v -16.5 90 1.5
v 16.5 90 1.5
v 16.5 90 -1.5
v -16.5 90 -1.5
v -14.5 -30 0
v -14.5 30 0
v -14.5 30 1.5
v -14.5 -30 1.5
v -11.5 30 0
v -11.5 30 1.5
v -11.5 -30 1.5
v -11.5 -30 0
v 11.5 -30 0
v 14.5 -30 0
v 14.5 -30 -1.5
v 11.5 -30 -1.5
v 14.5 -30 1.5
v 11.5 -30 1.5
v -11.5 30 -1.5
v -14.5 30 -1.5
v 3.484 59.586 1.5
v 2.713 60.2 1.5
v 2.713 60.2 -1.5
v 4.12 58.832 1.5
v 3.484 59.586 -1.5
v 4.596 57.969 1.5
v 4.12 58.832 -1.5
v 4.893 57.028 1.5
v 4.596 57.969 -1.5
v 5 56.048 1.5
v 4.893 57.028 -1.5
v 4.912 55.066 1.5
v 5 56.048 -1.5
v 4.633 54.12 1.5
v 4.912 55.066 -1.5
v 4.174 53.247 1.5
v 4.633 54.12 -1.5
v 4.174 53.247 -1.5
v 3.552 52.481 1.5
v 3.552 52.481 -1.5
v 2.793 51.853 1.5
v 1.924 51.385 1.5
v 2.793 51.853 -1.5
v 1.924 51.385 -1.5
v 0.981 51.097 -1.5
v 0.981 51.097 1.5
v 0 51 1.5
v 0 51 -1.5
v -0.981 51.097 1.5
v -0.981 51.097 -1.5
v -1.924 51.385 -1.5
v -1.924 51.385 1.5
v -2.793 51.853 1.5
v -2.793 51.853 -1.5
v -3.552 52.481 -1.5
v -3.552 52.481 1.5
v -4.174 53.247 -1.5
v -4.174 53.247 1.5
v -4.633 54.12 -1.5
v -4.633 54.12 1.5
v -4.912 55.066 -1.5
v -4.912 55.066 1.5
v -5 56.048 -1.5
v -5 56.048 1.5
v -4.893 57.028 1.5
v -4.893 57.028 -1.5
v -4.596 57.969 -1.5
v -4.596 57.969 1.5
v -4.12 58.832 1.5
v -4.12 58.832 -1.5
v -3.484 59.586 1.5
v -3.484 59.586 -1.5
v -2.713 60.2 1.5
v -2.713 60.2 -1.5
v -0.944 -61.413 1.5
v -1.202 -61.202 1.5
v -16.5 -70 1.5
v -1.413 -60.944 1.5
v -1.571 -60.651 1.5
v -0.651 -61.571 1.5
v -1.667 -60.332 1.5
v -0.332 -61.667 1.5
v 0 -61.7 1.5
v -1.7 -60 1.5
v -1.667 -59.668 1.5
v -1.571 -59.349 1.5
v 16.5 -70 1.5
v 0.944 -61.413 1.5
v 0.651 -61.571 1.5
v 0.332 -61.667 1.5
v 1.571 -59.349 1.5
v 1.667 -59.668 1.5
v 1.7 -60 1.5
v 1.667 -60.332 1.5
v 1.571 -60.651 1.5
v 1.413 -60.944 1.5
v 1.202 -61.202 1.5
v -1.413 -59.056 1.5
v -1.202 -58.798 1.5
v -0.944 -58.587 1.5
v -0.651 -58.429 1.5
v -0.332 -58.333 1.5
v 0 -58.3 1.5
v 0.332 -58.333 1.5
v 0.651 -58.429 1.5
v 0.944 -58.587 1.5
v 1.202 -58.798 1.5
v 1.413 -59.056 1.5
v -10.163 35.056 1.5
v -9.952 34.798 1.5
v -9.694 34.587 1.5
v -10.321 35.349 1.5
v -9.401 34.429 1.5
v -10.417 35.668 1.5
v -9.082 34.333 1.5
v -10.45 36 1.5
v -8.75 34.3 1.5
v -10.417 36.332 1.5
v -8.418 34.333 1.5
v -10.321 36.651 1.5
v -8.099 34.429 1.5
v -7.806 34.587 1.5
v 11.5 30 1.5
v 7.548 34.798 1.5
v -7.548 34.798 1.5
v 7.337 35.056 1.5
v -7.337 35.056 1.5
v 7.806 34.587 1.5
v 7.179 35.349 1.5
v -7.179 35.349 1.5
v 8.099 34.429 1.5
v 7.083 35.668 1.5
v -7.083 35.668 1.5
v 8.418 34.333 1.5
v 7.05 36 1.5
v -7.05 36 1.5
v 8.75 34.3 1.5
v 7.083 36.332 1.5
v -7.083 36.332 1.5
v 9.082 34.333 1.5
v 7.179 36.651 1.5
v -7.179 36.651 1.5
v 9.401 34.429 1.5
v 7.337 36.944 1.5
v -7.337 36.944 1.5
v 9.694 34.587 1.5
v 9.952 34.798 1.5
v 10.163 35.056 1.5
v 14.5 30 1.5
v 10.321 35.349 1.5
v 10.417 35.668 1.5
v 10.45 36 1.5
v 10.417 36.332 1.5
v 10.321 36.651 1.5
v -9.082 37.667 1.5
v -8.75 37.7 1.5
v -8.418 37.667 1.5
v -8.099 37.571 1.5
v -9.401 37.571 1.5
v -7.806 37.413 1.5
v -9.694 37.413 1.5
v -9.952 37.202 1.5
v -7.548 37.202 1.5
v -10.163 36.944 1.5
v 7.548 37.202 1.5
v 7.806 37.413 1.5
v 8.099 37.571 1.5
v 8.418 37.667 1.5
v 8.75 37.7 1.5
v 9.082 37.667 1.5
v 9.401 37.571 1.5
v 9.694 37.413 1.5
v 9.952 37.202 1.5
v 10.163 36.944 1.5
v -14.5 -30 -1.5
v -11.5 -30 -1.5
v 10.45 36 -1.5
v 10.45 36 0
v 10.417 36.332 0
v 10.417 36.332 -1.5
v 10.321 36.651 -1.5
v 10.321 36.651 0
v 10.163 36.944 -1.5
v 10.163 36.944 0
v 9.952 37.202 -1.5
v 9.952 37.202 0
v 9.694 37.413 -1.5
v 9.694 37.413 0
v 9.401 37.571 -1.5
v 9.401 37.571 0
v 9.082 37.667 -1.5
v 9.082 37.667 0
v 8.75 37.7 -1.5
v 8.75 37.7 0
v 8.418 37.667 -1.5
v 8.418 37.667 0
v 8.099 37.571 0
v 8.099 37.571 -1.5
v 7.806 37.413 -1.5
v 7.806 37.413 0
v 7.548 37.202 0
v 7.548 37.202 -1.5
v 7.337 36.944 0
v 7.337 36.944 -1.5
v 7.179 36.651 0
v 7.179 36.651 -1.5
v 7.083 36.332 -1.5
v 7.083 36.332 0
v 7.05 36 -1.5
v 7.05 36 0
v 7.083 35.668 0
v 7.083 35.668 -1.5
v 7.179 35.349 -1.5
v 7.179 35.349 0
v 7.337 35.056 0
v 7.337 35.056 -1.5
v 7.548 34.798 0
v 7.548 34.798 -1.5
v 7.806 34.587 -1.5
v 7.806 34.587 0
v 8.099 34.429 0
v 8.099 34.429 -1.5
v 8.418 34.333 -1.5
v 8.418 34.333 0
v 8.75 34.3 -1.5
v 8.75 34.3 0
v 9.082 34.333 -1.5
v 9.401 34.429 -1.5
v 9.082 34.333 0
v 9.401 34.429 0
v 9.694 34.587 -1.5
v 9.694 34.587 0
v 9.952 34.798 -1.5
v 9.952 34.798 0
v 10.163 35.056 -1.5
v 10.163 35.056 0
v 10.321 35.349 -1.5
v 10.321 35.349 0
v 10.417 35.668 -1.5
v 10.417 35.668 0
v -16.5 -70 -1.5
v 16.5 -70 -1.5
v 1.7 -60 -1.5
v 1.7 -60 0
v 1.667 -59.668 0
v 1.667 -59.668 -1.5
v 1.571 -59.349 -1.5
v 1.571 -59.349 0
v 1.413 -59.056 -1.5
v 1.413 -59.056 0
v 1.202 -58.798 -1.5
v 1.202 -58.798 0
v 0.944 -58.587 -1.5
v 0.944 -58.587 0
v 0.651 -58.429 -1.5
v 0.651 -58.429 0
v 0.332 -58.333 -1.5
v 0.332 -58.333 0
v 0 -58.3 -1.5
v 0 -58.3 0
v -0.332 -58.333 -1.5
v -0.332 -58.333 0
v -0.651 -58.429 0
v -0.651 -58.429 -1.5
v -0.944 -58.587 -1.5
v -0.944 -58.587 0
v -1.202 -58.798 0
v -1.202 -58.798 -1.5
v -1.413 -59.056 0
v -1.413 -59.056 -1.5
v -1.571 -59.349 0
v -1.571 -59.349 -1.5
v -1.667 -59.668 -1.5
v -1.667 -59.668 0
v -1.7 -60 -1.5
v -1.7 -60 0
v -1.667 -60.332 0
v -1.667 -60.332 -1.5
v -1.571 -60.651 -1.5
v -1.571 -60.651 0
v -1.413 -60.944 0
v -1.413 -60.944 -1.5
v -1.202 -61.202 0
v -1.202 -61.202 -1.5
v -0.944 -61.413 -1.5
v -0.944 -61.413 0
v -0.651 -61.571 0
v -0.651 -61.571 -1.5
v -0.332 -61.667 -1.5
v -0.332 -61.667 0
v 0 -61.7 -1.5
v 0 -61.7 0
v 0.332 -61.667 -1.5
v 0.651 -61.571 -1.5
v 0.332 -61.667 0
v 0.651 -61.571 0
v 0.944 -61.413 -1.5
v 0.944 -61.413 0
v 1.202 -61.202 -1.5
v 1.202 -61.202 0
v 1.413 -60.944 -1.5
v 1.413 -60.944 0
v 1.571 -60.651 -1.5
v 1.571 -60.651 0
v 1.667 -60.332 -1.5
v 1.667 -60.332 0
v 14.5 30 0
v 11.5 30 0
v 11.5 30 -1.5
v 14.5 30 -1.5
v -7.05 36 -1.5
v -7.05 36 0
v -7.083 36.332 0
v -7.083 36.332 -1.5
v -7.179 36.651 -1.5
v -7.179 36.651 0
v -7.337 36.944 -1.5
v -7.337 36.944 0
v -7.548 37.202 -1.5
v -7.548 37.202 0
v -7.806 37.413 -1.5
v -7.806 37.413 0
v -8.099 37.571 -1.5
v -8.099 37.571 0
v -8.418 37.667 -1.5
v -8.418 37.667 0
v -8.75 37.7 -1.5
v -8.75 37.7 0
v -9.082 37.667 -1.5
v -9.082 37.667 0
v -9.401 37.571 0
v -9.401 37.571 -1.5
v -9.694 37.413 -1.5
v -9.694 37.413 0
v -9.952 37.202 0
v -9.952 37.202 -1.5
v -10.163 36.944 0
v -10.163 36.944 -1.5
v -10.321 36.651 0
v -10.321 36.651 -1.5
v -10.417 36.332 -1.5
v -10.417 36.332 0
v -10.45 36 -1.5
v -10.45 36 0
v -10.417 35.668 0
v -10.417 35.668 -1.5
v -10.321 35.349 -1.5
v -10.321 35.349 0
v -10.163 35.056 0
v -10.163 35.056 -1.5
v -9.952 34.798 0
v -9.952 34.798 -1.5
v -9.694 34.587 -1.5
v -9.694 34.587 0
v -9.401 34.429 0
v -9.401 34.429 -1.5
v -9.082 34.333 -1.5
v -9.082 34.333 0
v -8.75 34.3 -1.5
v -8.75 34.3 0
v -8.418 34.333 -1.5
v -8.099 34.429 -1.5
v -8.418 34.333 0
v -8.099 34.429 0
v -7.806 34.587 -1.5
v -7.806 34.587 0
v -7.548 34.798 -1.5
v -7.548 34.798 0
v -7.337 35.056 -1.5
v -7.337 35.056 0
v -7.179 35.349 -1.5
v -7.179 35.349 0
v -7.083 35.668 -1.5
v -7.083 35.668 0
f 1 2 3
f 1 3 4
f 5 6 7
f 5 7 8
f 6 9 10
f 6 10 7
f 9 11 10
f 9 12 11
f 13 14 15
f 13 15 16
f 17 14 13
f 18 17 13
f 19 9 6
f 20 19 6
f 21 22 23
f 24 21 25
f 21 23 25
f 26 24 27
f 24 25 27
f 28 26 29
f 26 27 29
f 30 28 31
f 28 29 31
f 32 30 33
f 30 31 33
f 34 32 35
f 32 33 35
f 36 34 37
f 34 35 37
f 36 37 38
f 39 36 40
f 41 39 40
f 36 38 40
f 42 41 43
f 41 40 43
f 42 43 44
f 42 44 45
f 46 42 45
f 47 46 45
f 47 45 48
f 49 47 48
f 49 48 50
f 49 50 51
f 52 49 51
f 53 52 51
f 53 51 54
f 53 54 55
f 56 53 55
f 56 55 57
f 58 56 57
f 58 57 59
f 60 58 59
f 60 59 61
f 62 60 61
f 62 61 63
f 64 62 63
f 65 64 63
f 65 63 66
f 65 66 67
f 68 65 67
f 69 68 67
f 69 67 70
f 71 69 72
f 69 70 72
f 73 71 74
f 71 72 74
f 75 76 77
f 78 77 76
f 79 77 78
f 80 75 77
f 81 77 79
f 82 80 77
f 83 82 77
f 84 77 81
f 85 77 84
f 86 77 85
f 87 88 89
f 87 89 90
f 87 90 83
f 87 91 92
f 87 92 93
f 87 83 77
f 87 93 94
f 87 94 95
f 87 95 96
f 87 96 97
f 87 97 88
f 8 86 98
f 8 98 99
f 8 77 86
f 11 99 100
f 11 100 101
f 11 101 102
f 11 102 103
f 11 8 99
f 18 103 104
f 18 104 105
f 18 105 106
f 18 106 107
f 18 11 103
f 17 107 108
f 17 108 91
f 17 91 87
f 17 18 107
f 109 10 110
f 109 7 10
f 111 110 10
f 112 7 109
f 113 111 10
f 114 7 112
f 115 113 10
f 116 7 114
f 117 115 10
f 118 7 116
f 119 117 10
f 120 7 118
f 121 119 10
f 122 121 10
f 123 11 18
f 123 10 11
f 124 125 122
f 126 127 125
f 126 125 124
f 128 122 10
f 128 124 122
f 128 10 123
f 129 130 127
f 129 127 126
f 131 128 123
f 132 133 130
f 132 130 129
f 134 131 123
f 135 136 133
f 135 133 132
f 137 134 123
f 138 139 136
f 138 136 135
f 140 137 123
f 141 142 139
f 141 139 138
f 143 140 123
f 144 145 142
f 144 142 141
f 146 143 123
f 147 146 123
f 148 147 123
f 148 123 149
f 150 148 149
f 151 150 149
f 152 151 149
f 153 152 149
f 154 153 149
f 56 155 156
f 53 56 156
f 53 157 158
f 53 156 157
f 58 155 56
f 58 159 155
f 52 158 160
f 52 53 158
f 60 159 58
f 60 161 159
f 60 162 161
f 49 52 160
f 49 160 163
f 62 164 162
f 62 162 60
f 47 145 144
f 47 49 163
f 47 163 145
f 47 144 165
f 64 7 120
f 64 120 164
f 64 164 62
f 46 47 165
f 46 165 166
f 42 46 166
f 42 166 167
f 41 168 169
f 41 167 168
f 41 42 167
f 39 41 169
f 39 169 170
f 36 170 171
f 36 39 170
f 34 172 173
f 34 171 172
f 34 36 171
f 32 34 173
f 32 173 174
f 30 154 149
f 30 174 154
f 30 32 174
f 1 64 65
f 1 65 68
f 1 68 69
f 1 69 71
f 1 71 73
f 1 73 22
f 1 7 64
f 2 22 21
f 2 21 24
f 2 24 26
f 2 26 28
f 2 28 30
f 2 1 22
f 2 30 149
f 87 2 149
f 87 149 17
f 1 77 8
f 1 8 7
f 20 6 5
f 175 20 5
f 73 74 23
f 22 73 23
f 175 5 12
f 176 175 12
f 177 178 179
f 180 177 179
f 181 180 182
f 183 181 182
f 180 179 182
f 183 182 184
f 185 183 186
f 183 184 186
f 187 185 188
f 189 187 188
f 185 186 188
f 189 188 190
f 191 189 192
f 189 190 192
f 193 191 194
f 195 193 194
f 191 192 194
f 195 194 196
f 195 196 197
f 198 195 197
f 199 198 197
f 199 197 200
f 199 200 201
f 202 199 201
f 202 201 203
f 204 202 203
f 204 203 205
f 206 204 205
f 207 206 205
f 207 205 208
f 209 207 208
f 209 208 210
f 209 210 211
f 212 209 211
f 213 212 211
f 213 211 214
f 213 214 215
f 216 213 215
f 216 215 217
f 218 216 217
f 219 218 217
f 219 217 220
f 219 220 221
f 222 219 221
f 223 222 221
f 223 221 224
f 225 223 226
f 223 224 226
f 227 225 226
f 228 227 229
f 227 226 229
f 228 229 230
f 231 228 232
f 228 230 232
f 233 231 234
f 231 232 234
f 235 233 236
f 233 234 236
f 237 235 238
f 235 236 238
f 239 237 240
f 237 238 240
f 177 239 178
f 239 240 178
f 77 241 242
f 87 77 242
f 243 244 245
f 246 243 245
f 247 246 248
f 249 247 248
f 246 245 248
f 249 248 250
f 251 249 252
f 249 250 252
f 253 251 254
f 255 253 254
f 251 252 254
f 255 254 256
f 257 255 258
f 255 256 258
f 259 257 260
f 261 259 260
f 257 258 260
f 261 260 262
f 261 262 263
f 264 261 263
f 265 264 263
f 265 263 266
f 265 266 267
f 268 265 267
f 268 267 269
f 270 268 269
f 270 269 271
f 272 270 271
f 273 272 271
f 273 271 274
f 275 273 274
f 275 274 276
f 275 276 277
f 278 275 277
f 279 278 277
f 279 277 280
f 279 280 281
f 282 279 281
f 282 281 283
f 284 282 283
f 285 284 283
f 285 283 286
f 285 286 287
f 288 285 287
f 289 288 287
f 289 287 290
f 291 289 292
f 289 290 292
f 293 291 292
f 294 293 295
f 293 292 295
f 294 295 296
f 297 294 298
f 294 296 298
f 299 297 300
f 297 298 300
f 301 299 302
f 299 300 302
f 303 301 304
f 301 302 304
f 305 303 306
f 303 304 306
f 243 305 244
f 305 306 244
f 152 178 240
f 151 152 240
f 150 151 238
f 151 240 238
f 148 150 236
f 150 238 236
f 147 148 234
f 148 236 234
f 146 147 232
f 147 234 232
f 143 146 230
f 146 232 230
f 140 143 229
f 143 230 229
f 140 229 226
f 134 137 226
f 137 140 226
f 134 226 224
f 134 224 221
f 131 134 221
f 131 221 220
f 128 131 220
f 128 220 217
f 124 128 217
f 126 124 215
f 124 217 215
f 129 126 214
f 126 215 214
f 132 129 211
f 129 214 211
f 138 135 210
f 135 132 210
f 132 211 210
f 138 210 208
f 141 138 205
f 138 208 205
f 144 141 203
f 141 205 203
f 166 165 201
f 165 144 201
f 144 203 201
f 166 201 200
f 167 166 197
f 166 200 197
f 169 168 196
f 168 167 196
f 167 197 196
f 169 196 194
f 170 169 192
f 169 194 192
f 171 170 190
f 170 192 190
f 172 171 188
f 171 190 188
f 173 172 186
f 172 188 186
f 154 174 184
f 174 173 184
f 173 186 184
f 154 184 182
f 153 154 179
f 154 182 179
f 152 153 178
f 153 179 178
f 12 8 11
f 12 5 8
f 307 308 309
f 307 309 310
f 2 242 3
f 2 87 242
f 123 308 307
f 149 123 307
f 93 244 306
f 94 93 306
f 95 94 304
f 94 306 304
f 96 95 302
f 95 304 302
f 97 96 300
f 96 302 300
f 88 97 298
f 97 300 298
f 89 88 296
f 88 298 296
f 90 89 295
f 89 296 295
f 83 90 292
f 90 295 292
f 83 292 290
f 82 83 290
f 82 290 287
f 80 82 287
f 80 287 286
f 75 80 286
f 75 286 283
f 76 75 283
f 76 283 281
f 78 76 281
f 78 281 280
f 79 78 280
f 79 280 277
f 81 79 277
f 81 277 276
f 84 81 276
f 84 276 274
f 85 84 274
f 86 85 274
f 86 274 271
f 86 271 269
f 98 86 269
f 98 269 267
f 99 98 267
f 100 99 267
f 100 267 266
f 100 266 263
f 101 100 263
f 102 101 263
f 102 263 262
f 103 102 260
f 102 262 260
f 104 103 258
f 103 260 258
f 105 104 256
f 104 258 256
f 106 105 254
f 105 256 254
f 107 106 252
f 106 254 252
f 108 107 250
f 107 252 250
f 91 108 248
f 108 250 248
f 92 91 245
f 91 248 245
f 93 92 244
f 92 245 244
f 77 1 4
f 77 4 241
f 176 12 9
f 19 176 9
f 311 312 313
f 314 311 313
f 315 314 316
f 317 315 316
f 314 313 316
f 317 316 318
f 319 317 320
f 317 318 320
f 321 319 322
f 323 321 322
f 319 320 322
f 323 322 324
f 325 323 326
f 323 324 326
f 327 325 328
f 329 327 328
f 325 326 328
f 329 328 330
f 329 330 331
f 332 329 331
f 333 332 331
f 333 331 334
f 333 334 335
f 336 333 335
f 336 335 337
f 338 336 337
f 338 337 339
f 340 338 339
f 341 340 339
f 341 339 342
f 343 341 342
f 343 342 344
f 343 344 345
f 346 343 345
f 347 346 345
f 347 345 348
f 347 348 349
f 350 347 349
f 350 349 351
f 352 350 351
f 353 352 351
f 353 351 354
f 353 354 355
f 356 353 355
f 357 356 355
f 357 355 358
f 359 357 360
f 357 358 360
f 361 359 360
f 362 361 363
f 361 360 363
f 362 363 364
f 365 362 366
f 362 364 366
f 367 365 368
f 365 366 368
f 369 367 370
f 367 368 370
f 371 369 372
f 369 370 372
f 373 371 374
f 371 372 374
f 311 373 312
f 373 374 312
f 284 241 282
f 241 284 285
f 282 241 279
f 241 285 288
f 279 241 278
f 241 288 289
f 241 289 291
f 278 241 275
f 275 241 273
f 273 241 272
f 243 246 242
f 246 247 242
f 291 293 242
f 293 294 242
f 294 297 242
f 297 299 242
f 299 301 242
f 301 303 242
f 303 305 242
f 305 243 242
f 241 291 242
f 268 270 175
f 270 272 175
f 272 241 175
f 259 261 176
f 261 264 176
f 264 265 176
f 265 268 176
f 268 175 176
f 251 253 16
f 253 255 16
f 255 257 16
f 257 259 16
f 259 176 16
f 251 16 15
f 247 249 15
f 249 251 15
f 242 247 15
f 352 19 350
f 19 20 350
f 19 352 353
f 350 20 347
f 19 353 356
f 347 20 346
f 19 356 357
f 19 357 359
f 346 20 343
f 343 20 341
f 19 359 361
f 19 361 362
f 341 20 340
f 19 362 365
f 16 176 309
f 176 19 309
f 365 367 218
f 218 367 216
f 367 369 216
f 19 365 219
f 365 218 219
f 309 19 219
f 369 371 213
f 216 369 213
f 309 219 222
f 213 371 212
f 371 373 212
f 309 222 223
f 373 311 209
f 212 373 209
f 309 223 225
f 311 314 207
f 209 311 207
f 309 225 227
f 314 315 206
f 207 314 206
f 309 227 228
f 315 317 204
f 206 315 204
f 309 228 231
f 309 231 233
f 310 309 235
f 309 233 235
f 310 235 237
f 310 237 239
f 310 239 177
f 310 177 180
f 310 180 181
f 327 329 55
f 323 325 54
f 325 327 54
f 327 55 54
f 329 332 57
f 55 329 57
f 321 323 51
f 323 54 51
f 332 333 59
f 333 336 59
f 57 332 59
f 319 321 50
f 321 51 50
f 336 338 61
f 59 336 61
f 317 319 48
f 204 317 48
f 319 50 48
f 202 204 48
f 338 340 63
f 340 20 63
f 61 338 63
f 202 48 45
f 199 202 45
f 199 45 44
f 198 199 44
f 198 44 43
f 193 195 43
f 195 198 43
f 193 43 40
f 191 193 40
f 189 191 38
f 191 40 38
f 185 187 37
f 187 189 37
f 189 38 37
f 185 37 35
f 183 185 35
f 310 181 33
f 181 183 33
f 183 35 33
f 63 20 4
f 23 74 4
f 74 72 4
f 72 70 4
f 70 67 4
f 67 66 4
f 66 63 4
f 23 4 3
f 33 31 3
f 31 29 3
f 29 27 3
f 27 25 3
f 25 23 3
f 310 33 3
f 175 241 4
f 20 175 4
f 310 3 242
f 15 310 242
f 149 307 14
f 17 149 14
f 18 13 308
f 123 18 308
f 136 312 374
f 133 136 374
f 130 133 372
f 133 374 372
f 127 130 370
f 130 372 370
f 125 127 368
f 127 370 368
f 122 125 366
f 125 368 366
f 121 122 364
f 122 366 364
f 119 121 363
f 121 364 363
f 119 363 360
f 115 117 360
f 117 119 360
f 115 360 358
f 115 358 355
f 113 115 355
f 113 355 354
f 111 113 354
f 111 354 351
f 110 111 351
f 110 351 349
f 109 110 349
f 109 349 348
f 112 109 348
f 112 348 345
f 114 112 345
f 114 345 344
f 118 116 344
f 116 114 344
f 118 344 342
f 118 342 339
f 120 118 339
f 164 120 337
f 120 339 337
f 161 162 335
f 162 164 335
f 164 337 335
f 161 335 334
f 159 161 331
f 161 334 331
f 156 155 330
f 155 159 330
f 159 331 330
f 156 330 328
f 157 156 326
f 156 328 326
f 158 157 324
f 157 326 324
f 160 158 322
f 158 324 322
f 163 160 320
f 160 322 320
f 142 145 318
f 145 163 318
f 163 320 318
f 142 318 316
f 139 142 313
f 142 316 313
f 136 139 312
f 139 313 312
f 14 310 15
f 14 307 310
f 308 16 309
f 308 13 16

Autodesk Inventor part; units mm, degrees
ref_plane "YZ Plane" through (0, 0, 0) normal (1, 0, 0) x (0, 1, 0)
ref_plane "XZ Plane" through (0, 0, 0) normal (0, 1, 0) x (-1, 0, 0)
ref_plane "XY Plane" through (0, 0, 0) normal (0, 0, 1) x (1, 0, 0)
sketch "Sketch1" plane through (0, 0, 0) normal (0, 0, 1) x (1, 0, 0)
  line L0 (-16.5, -70) -> (16.5, -70)
  line L1 (16.5, -70) -> (16.5, 70)
  line L2 (16.5, 70) -> (-16.5, 70)
  line L3 (-16.5, 70) -> (-16.5, -70)
  line L4 (-16.5, -70) -> (16.5, 70) construction
  line L5 (16.5, -70) -> (-16.5, 70) construction
  line L6 (0, 70) -> (0, -70)
  line L7 (11.5, 30) -> (14.5, 30)
  line L8 (14.5, 30) -> (14.5, -30)
  line L9 (14.5, -30) -> (11.5, -30)
  line L10 (11.5, -30) -> (11.5, 30)
  circle A0 centre (0, 56) radius 5
  line L11 (-11.5, 30) -> (-14.5, 30)
  line L12 (-14.5, 30) -> (-14.5, -30)
  line L13 (-14.5, -30) -> (-11.5, -30)
  line L14 (-11.5, -30) -> (-11.5, 30)
  circle A1 centre (0, -60) radius 1.7
  circle A2 centre (-8.75, 36) radius 1.7
  circle A3 centre (8.75, 36) radius 1.7
  line L15 (-2.7129, 60.2) -> (2.7129, 60.2)
  point P0 (0, 0)
  point P1 (14.5, 0)
  point P2 (16.5, 0)
  point P3 (-14.5, 0)
  dimension "d1" = 140
  dimension "d2" = 3
  dimension "d3" = 2
  dimension "d4" = 60
  dimension "d5" = 10
  dimension "d6" = 14
  dimension "d7" = 3.4
  dimension "d8" = 10
  dimension "d9" = 3.4
  dimension "d10" = 23
  dimension "d11" = 20
  dimension "d21" = 4.2
  dimension "d22" = 17.5
sketch "Sketch3" plane through (0, 0, 1.5) normal (0, 0, 1) x (1, 0, 0)
  line L0 (-16.5, 70) -> (-16.5, -70)
  line L1 (-16.5, 70) -> (16.5, 70)
  line L2 (16.5, 70) -> (16.5, 90)
  line L3 (16.5, 90) -> (-16.5, 90)
  line L4 (-16.5, 90) -> (-16.5, 70)
  line L5 (16.5, 70) -> (16.5, -70)
  point P0 (0, 0)
  point P1 (16.5, 0)
  dimension "d24" = 20
extrude "Plate1" add sketch "Sketch1" along normal mid plane 3 contours L3 L2 L6 A0 A1 L0 | L6 A1 A0 L2 L1 L0 | A0 L15 L6 | L6 L15 A0 picked at (1.5261, 60.3463) picked at (-1.5261, 60.3463)
sheet face with bend "Face3" sketch "Sketch3" thickness 3 toward (0, 0, -1) bend radius 3
bend "Bend2"
equation "\"d13\" = Thickness"
equation "\"d25\" = BendRadius"
equation "\"d26\" = BendReliefWidth"
equation "\"d28\" = MinimumRemnant"
equation "\"d27\" = BendReliefDepth"
equation "\"d29\" = TransitionRadius"
equation "\"BendRadius\" = Thickness"
equation "\"BendReliefWidth\" = Thickness"
equation "\"BendReliefDepth\" = 0.5 * Thickness"
equation "\"CornerReliefSize\" = 4 * Thickness"
equation "\"MinimumRemnant\" = 2 * Thickness"
equation "\"TransitionRadius\" = BendRadius"
equation "\"JacobiRadiusSize\" = BendRadius"
equation "\"GapSize\" = Thickness"
equation "\"Thickness\" = 3"
properties part number "Motor Fixation .1"
